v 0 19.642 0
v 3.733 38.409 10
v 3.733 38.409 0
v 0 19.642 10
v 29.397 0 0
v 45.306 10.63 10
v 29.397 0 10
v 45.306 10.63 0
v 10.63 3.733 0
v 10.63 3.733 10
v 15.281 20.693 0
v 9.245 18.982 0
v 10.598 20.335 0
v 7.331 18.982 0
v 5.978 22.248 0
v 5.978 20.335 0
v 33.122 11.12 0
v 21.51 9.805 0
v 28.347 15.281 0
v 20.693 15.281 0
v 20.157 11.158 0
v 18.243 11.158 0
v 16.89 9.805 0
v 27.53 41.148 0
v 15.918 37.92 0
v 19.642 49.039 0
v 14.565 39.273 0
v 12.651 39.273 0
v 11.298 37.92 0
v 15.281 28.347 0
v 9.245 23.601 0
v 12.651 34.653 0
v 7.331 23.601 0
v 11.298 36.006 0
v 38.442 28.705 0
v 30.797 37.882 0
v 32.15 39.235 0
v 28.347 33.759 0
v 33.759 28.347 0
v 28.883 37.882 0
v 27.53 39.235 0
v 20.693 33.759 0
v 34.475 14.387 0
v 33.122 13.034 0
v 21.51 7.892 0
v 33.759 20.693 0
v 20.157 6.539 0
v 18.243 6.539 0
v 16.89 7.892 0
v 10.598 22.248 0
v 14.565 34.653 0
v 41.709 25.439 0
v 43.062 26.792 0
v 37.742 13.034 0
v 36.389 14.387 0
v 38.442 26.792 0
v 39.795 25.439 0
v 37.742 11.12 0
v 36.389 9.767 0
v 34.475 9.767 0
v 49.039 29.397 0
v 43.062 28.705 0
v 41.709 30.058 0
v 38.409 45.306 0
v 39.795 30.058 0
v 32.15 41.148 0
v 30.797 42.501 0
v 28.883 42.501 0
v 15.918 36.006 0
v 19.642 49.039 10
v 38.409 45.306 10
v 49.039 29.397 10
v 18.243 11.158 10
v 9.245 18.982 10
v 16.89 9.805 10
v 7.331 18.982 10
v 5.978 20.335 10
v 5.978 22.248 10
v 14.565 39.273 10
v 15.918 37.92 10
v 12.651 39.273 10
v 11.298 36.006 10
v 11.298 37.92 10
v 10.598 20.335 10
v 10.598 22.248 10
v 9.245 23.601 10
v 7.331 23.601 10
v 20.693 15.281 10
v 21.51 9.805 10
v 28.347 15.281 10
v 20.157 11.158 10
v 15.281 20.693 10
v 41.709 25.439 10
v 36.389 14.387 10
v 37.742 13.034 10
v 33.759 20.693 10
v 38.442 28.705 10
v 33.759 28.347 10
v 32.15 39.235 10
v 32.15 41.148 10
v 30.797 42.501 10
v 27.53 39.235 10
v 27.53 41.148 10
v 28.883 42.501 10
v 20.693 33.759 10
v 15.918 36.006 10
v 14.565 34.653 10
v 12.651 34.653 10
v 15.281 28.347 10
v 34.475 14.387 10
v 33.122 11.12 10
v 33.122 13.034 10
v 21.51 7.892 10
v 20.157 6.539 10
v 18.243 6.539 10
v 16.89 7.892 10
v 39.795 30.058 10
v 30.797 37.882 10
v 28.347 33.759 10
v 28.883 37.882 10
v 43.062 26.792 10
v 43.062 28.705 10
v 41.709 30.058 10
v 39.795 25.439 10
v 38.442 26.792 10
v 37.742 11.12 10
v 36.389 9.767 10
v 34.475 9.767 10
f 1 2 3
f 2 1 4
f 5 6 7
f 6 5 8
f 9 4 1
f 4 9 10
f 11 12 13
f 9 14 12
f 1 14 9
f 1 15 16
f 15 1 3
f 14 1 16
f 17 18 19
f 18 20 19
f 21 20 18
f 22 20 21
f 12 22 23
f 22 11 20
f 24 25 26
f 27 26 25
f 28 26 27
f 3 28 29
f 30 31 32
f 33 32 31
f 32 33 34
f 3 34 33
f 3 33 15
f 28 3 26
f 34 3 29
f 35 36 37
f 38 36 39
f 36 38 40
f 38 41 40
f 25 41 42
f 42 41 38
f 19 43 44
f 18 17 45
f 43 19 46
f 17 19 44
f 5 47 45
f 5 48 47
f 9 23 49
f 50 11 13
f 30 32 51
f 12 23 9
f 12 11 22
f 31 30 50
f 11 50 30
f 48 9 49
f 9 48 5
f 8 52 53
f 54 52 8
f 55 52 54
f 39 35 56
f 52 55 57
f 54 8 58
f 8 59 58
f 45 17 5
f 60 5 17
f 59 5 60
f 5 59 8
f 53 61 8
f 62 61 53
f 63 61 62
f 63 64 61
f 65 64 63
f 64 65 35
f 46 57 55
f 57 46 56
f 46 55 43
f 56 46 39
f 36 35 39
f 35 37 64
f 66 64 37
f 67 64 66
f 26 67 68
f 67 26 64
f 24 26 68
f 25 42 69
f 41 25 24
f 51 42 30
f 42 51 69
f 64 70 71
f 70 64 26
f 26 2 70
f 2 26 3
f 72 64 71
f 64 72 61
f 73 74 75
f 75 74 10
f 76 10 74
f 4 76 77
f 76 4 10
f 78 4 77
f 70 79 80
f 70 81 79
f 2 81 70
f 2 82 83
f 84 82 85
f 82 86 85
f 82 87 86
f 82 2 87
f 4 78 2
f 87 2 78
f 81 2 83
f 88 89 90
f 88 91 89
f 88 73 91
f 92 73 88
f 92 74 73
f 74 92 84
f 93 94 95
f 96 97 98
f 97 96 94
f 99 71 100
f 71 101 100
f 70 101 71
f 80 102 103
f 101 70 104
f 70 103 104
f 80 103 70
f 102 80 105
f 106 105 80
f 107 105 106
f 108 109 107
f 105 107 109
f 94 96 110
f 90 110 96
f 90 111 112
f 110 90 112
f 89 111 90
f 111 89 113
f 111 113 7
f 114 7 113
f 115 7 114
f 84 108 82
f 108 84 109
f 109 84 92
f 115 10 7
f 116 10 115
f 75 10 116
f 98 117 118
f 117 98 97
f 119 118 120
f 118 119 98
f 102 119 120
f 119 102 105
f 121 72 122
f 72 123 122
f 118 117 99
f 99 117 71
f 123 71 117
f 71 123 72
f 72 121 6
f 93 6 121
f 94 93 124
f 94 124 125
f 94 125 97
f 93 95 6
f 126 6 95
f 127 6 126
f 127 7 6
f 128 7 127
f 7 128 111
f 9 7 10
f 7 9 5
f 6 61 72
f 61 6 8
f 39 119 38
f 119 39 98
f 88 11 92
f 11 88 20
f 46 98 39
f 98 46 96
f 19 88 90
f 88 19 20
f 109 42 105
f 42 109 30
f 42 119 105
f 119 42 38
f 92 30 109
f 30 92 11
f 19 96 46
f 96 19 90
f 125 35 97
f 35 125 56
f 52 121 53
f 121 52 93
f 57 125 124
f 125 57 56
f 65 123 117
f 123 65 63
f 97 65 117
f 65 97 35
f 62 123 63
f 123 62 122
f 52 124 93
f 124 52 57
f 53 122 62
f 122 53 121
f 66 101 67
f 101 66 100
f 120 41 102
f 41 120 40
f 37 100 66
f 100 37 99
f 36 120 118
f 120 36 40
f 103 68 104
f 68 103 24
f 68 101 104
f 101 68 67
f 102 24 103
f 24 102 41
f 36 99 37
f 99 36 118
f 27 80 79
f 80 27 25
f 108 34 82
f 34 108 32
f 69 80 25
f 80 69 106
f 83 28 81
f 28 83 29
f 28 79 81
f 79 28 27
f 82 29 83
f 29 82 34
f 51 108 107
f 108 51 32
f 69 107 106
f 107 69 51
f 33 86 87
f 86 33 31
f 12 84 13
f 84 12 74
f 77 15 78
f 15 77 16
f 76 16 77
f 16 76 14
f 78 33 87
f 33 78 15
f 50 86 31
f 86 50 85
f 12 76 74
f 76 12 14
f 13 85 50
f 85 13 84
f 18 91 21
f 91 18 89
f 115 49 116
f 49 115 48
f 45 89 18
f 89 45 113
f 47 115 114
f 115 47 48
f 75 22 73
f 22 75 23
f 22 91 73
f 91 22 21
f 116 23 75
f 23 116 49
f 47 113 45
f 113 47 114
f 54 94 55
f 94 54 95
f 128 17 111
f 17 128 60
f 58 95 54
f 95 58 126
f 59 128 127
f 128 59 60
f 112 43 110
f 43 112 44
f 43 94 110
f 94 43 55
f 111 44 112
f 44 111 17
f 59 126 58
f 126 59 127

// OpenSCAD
$fn = 32;

// ----------------------------------------------------------------------
// Polygon plate: 8-gon R25, 6 bolt windows
// ----------------------------------------------------------------------

// --- parameters (mm) ---
sides = 8;                // number of polygon sides
plate_r = 25;             // circumscribed radius of the polygon
bore_r = 10;              // centre bore radius
bolts = 6;                // number of bolt windows
ring_r = 16.55;           // bolt-circle radius
bolt_r = 2.5;             // bolt window radius
plate_t = 10;             // plate thickness, Z (extrusion height)

plate_d = 2 * plate_r;  // circumscribed diameter
bore_d = 2 * bore_r;  // centre bore diameter
bolt_d = 2 * bolt_r;  // bolt window diameter
ring_d = 2 * ring_r;  // bolt-circle diameter

profile = [[49.039, 29.397], [38.409, 45.306], [19.642, 49.039], [3.733, 38.409], [0, 19.642], [10.63, 3.733], [29.397, 0], [45.306, 10.63]];  // primary outline, 8 points, counter clockwise
void_1 = [[33.759, 28.347], [28.347, 33.759], [20.693, 33.759], [15.281, 28.347], [15.281, 20.693], [20.693, 15.281], [28.347, 15.281], [33.759, 20.693]];  // centre bore, 8 points
void_2 = [[43.062, 28.705], [41.709, 30.058], [39.795, 30.058], [38.442, 28.705], [38.442, 26.792], [39.795, 25.439], [41.709, 25.439], [43.062, 26.792]];  // bolt window 1, 8 points
void_3 = [[32.15, 41.148], [30.797, 42.501], [28.883, 42.501], [27.53, 41.148], [27.53, 39.235], [28.883, 37.882], [30.797, 37.882], [32.15, 39.235]];  // bolt window 2, 8 points
void_4 = [[15.918, 37.92], [14.565, 39.273], [12.651, 39.273], [11.298, 37.92], [11.298, 36.006], [12.651, 34.653], [14.565, 34.653], [15.918, 36.006]];  // bolt window 3, 8 points
void_5 = [[10.598, 22.248], [9.245, 23.601], [7.331, 23.601], [5.978, 22.248], [5.978, 20.335], [7.331, 18.982], [9.245, 18.982], [10.598, 20.335]];  // bolt window 4, 8 points
void_6 = [[21.51, 9.805], [20.157, 11.158], [18.243, 11.158], [16.89, 9.805], [16.89, 7.892], [18.243, 6.539], [20.157, 6.539], [21.51, 7.892]];  // bolt window 5, 8 points
void_7 = [[37.742, 13.034], [36.389, 14.387], [34.475, 14.387], [33.122, 13.034], [33.122, 11.12], [34.475, 9.767], [36.389, 9.767], [37.742, 11.12]];  // bolt window 6, 8 points

// --- the one profile operation ---
difference() {
  linear_extrude(height = plate_t) polygon(points = profile);
  translate([0, 0, -1])
    linear_extrude(height = plate_t + 2) polygon(points = void_1);
  translate([0, 0, -1])
    linear_extrude(height = plate_t + 2) polygon(points = void_2);
  translate([0, 0, -1])
    linear_extrude(height = plate_t + 2) polygon(points = void_3);
  translate([0, 0, -1])
    linear_extrude(height = plate_t + 2) polygon(points = void_4);
  translate([0, 0, -1])
    linear_extrude(height = plate_t + 2) polygon(points = void_5);
  translate([0, 0, -1])
    linear_extrude(height = plate_t + 2) polygon(points = void_6);
  translate([0, 0, -1])
    linear_extrude(height = plate_t + 2) polygon(points = void_7);
}
